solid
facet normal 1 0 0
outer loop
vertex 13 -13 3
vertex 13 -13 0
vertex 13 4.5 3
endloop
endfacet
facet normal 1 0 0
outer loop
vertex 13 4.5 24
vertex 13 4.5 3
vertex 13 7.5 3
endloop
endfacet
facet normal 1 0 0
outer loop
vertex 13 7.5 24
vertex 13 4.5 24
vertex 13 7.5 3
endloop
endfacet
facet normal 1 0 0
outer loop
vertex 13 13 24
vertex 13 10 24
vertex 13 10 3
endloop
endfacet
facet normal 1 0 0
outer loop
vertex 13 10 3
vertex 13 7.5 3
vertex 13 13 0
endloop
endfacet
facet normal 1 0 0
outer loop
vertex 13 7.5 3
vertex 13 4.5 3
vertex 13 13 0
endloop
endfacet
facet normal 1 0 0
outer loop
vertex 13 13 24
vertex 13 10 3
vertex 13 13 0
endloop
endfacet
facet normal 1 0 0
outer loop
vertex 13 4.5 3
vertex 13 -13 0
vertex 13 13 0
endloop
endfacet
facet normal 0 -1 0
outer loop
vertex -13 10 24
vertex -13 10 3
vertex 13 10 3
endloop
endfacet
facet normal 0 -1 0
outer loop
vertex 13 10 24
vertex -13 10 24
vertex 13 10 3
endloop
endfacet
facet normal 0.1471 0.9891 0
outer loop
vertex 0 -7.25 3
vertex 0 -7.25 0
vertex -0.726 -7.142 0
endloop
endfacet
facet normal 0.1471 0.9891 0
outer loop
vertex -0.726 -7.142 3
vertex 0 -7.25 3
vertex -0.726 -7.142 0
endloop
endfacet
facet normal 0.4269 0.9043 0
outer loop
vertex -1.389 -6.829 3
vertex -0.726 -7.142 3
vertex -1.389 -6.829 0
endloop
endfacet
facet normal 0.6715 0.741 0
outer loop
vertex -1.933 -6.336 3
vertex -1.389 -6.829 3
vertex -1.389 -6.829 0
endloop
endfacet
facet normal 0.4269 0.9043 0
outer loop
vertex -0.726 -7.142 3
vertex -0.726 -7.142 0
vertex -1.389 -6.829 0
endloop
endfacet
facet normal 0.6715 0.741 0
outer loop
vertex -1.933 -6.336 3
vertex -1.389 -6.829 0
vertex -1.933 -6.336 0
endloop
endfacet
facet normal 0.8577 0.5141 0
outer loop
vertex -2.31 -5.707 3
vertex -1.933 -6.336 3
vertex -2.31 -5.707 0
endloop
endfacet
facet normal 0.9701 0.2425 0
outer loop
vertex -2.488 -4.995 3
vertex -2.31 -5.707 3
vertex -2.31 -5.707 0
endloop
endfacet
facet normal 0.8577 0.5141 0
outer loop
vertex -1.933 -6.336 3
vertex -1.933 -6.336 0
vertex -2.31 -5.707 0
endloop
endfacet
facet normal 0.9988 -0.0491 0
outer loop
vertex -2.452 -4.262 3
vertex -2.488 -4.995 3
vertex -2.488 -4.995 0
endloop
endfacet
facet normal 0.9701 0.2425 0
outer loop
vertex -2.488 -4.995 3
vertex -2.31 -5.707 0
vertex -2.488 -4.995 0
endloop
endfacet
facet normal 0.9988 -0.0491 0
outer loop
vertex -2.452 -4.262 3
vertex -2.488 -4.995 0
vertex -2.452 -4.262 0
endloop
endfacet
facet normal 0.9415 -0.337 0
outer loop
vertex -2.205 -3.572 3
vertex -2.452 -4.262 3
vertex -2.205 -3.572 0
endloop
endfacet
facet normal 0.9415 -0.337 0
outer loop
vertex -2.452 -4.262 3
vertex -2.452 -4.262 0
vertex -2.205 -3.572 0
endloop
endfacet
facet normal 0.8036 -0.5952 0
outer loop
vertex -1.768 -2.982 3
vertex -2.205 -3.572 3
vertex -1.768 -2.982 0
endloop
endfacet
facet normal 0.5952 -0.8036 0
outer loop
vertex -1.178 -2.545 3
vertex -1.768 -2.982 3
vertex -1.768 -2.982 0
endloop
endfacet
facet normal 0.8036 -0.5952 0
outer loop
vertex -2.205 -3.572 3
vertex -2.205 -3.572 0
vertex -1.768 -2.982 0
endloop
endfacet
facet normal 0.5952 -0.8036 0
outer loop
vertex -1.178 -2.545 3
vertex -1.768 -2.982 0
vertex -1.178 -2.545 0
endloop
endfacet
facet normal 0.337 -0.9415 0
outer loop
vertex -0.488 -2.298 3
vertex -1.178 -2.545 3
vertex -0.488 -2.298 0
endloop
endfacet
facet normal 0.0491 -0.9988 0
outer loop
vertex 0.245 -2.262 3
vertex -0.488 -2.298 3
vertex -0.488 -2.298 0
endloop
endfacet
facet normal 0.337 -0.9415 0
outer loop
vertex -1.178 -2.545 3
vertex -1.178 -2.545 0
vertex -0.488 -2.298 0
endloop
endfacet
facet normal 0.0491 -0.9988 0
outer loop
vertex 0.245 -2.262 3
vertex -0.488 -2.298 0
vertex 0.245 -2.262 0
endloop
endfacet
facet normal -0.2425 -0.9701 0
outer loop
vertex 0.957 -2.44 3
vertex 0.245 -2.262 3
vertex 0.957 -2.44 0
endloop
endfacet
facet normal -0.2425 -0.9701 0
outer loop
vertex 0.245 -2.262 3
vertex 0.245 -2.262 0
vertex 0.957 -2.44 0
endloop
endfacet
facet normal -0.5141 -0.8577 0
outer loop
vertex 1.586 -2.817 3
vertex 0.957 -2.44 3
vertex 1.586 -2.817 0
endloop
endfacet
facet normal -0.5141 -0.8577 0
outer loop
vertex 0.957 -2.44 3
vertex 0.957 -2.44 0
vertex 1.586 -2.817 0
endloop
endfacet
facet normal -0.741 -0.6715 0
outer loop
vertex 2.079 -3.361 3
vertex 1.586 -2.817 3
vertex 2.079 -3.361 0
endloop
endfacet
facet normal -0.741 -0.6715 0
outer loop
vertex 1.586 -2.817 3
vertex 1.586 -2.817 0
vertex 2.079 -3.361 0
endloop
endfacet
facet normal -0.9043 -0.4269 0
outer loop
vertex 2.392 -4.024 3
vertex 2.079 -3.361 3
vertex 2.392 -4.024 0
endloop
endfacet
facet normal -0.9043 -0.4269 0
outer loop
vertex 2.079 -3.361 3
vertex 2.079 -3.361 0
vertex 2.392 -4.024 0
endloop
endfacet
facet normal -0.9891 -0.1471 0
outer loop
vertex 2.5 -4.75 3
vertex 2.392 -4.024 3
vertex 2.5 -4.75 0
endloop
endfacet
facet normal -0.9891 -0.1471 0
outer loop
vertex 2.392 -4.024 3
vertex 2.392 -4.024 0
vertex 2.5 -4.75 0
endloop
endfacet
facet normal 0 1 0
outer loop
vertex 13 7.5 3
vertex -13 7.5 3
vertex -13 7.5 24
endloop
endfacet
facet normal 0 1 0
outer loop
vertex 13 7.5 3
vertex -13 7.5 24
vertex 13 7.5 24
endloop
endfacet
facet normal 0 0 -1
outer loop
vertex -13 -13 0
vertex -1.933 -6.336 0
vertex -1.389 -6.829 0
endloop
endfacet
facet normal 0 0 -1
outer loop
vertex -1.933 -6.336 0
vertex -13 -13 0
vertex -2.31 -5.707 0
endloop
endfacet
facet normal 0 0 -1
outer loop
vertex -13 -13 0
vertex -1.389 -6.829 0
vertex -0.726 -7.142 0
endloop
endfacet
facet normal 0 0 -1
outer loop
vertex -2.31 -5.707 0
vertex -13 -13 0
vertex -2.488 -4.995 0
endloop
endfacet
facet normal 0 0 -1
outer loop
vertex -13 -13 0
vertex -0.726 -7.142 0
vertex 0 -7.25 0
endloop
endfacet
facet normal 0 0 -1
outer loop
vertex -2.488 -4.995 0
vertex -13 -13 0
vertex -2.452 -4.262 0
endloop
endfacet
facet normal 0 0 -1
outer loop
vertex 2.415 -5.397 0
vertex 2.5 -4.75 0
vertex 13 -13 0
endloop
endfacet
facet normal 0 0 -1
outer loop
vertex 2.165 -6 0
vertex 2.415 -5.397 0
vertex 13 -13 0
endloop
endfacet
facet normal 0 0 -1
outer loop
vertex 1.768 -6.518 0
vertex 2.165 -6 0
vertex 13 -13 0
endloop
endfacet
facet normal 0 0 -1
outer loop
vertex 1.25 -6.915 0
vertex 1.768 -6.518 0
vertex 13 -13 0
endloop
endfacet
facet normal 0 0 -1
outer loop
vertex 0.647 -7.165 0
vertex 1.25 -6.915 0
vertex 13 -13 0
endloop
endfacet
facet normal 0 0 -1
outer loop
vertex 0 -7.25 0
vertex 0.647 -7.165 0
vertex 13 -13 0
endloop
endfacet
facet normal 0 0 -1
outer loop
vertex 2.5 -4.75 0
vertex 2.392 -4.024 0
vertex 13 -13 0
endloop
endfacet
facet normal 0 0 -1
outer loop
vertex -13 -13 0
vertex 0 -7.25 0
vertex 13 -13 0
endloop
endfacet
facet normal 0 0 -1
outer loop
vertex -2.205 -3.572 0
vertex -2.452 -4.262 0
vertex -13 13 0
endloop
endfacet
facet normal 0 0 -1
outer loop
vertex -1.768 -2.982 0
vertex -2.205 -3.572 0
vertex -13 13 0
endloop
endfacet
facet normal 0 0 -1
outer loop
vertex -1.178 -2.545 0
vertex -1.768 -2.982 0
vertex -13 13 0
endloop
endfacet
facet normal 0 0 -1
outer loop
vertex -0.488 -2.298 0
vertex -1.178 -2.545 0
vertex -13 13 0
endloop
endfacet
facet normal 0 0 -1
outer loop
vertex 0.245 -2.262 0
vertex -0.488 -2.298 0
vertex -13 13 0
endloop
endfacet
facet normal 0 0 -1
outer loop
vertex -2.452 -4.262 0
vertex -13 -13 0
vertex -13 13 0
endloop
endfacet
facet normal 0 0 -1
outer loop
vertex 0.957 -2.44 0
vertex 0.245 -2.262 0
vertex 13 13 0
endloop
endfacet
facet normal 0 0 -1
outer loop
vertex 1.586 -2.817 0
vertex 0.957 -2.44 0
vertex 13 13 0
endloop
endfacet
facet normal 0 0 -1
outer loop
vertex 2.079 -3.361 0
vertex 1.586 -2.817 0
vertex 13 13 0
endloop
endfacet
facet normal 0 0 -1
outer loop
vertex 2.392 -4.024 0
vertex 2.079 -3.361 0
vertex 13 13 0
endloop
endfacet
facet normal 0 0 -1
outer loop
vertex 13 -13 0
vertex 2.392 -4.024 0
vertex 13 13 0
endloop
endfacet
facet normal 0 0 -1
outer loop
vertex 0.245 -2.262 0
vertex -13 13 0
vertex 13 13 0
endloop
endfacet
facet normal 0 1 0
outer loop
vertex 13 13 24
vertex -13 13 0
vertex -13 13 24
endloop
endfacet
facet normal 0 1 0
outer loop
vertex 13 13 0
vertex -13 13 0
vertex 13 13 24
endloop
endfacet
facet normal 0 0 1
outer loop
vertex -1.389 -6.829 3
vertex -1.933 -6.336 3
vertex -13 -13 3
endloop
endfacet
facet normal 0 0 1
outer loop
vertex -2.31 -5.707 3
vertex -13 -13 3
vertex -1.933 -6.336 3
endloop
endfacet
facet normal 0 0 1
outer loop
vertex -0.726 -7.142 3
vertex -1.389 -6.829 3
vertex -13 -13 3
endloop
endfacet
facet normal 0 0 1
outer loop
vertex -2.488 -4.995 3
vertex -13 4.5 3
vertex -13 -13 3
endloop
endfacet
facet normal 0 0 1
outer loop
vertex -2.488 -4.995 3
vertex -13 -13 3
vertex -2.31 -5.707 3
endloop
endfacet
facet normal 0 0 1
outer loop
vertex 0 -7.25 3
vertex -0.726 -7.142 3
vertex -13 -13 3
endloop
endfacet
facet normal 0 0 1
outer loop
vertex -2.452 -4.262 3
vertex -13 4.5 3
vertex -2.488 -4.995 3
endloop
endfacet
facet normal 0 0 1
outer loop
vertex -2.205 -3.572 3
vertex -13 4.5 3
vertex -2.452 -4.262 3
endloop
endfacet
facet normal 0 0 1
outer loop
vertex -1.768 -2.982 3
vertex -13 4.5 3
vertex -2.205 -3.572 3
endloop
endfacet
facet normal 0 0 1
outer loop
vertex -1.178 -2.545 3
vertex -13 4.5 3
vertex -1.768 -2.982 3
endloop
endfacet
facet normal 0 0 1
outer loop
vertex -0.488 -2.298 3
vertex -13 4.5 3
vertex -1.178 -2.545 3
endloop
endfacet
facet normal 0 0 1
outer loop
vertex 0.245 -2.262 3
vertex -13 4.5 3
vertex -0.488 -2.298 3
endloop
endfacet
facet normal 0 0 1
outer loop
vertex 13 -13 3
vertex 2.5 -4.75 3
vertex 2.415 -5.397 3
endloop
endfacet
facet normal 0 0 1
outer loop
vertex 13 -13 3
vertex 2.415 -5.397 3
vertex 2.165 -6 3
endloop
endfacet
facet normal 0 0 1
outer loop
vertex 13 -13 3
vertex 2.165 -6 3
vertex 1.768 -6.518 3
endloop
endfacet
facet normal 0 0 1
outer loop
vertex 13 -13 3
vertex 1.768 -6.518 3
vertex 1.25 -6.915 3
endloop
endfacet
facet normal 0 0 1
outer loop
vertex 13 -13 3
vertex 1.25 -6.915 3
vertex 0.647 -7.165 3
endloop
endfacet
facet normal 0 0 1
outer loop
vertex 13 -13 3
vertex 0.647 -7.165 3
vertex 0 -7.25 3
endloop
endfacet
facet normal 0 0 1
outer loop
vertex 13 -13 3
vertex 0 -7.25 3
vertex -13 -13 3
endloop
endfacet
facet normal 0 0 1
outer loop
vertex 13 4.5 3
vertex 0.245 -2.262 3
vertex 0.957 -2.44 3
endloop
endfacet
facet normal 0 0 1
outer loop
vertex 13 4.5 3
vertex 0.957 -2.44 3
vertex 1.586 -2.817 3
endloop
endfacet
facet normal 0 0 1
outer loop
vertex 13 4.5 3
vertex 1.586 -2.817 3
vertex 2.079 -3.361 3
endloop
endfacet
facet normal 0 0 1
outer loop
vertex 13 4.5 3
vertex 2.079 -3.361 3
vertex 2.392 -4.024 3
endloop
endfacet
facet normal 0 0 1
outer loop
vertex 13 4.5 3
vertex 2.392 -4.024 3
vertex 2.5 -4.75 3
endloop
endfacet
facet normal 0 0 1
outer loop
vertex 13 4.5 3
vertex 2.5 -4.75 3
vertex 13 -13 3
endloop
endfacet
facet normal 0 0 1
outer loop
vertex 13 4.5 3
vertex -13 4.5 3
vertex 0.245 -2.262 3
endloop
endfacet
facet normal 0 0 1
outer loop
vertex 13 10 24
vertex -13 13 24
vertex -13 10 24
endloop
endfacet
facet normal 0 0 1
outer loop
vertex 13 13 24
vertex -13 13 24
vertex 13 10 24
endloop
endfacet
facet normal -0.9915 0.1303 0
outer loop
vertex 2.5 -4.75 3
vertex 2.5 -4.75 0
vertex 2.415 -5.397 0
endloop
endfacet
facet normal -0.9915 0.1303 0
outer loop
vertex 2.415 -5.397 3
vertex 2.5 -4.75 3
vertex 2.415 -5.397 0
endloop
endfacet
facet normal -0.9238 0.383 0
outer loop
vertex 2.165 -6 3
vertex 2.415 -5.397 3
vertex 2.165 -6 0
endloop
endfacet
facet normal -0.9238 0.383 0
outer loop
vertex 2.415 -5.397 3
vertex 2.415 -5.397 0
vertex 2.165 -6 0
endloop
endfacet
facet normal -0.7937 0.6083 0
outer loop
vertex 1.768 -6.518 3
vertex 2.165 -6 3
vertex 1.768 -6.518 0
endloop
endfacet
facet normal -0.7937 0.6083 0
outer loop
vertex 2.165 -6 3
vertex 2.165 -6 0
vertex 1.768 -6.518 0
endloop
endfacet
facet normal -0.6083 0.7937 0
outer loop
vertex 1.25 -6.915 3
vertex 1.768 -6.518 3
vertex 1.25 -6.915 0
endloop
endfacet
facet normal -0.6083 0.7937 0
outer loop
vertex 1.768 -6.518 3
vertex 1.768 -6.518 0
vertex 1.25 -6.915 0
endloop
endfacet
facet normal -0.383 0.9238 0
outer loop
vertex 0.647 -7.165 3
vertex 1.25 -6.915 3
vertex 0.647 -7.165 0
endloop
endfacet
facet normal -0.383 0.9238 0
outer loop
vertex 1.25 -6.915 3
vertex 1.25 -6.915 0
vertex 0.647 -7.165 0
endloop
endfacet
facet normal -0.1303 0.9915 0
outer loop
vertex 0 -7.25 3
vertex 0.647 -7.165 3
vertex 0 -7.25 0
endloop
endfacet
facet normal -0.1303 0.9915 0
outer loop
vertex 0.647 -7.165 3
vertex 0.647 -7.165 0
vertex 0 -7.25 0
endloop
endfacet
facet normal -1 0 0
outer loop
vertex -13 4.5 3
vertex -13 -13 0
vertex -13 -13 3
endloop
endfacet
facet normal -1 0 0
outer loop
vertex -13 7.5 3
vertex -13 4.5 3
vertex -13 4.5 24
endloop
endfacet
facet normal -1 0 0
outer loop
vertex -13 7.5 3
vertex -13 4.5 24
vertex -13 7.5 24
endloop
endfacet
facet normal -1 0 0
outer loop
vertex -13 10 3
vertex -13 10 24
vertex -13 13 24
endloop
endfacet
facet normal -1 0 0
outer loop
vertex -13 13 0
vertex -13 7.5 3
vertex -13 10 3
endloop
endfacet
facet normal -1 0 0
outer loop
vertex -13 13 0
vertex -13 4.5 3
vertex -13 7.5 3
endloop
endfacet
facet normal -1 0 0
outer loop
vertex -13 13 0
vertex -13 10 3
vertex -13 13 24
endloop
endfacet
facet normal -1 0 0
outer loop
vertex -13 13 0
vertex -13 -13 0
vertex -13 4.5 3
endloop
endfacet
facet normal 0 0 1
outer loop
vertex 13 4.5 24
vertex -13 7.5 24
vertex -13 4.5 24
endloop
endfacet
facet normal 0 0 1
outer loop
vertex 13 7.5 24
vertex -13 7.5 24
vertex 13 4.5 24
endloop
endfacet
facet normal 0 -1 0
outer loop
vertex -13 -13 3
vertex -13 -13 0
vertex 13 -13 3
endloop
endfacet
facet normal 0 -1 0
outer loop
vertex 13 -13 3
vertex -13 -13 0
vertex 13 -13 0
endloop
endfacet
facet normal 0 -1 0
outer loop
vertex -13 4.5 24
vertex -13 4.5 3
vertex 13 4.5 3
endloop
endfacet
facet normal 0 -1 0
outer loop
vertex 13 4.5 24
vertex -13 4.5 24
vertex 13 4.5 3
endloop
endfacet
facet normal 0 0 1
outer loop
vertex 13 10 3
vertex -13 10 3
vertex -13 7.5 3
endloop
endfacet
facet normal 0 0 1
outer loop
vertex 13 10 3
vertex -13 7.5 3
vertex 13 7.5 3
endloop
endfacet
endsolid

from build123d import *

# Parameters (mm, degrees)
F0_W     = 26
F0_H     = 3
F1_DEPTH = 24
F0_H_2   = 2.5
F2_DEPTH = 3


with BuildPart() as f1:
    # F0 (on Top) → F1 (new body)
    with BuildSketch(Plane.XY):
        with Locations((0, 11.5)):
            Rectangle(F0_W, F0_H)
        with Locations((0, 6)):
            Rectangle(F0_W, F0_H)
    extrude(amount=F1_DEPTH)

    # F0 (on Top) → F2 (join)
    with BuildSketch(Plane.XY):
        with Locations((0, 11.5)):
            Rectangle(F0_W, F0_H)
        with Locations((0, 8.75)):
            Rectangle(F0_W, F0_H_2)
        with Locations((0, 6)):
            Rectangle(F0_W, F0_H)
        Polygon((0, -13), (13, -13), (13, 4.5), (-13, 4.5), (-13, -13), align=None)
        with BuildLine():
            ThreePointArc((2.5, -4.75), (1.767767, -6.517767), (0, -7.25))
            ThreePointArc((0, -7.25), (-1.767767, -2.982233), (2.5, -4.75))
        make_face(mode=Mode.SUBTRACT)
    extrude(amount=F2_DEPTH)


solid = f1.part
